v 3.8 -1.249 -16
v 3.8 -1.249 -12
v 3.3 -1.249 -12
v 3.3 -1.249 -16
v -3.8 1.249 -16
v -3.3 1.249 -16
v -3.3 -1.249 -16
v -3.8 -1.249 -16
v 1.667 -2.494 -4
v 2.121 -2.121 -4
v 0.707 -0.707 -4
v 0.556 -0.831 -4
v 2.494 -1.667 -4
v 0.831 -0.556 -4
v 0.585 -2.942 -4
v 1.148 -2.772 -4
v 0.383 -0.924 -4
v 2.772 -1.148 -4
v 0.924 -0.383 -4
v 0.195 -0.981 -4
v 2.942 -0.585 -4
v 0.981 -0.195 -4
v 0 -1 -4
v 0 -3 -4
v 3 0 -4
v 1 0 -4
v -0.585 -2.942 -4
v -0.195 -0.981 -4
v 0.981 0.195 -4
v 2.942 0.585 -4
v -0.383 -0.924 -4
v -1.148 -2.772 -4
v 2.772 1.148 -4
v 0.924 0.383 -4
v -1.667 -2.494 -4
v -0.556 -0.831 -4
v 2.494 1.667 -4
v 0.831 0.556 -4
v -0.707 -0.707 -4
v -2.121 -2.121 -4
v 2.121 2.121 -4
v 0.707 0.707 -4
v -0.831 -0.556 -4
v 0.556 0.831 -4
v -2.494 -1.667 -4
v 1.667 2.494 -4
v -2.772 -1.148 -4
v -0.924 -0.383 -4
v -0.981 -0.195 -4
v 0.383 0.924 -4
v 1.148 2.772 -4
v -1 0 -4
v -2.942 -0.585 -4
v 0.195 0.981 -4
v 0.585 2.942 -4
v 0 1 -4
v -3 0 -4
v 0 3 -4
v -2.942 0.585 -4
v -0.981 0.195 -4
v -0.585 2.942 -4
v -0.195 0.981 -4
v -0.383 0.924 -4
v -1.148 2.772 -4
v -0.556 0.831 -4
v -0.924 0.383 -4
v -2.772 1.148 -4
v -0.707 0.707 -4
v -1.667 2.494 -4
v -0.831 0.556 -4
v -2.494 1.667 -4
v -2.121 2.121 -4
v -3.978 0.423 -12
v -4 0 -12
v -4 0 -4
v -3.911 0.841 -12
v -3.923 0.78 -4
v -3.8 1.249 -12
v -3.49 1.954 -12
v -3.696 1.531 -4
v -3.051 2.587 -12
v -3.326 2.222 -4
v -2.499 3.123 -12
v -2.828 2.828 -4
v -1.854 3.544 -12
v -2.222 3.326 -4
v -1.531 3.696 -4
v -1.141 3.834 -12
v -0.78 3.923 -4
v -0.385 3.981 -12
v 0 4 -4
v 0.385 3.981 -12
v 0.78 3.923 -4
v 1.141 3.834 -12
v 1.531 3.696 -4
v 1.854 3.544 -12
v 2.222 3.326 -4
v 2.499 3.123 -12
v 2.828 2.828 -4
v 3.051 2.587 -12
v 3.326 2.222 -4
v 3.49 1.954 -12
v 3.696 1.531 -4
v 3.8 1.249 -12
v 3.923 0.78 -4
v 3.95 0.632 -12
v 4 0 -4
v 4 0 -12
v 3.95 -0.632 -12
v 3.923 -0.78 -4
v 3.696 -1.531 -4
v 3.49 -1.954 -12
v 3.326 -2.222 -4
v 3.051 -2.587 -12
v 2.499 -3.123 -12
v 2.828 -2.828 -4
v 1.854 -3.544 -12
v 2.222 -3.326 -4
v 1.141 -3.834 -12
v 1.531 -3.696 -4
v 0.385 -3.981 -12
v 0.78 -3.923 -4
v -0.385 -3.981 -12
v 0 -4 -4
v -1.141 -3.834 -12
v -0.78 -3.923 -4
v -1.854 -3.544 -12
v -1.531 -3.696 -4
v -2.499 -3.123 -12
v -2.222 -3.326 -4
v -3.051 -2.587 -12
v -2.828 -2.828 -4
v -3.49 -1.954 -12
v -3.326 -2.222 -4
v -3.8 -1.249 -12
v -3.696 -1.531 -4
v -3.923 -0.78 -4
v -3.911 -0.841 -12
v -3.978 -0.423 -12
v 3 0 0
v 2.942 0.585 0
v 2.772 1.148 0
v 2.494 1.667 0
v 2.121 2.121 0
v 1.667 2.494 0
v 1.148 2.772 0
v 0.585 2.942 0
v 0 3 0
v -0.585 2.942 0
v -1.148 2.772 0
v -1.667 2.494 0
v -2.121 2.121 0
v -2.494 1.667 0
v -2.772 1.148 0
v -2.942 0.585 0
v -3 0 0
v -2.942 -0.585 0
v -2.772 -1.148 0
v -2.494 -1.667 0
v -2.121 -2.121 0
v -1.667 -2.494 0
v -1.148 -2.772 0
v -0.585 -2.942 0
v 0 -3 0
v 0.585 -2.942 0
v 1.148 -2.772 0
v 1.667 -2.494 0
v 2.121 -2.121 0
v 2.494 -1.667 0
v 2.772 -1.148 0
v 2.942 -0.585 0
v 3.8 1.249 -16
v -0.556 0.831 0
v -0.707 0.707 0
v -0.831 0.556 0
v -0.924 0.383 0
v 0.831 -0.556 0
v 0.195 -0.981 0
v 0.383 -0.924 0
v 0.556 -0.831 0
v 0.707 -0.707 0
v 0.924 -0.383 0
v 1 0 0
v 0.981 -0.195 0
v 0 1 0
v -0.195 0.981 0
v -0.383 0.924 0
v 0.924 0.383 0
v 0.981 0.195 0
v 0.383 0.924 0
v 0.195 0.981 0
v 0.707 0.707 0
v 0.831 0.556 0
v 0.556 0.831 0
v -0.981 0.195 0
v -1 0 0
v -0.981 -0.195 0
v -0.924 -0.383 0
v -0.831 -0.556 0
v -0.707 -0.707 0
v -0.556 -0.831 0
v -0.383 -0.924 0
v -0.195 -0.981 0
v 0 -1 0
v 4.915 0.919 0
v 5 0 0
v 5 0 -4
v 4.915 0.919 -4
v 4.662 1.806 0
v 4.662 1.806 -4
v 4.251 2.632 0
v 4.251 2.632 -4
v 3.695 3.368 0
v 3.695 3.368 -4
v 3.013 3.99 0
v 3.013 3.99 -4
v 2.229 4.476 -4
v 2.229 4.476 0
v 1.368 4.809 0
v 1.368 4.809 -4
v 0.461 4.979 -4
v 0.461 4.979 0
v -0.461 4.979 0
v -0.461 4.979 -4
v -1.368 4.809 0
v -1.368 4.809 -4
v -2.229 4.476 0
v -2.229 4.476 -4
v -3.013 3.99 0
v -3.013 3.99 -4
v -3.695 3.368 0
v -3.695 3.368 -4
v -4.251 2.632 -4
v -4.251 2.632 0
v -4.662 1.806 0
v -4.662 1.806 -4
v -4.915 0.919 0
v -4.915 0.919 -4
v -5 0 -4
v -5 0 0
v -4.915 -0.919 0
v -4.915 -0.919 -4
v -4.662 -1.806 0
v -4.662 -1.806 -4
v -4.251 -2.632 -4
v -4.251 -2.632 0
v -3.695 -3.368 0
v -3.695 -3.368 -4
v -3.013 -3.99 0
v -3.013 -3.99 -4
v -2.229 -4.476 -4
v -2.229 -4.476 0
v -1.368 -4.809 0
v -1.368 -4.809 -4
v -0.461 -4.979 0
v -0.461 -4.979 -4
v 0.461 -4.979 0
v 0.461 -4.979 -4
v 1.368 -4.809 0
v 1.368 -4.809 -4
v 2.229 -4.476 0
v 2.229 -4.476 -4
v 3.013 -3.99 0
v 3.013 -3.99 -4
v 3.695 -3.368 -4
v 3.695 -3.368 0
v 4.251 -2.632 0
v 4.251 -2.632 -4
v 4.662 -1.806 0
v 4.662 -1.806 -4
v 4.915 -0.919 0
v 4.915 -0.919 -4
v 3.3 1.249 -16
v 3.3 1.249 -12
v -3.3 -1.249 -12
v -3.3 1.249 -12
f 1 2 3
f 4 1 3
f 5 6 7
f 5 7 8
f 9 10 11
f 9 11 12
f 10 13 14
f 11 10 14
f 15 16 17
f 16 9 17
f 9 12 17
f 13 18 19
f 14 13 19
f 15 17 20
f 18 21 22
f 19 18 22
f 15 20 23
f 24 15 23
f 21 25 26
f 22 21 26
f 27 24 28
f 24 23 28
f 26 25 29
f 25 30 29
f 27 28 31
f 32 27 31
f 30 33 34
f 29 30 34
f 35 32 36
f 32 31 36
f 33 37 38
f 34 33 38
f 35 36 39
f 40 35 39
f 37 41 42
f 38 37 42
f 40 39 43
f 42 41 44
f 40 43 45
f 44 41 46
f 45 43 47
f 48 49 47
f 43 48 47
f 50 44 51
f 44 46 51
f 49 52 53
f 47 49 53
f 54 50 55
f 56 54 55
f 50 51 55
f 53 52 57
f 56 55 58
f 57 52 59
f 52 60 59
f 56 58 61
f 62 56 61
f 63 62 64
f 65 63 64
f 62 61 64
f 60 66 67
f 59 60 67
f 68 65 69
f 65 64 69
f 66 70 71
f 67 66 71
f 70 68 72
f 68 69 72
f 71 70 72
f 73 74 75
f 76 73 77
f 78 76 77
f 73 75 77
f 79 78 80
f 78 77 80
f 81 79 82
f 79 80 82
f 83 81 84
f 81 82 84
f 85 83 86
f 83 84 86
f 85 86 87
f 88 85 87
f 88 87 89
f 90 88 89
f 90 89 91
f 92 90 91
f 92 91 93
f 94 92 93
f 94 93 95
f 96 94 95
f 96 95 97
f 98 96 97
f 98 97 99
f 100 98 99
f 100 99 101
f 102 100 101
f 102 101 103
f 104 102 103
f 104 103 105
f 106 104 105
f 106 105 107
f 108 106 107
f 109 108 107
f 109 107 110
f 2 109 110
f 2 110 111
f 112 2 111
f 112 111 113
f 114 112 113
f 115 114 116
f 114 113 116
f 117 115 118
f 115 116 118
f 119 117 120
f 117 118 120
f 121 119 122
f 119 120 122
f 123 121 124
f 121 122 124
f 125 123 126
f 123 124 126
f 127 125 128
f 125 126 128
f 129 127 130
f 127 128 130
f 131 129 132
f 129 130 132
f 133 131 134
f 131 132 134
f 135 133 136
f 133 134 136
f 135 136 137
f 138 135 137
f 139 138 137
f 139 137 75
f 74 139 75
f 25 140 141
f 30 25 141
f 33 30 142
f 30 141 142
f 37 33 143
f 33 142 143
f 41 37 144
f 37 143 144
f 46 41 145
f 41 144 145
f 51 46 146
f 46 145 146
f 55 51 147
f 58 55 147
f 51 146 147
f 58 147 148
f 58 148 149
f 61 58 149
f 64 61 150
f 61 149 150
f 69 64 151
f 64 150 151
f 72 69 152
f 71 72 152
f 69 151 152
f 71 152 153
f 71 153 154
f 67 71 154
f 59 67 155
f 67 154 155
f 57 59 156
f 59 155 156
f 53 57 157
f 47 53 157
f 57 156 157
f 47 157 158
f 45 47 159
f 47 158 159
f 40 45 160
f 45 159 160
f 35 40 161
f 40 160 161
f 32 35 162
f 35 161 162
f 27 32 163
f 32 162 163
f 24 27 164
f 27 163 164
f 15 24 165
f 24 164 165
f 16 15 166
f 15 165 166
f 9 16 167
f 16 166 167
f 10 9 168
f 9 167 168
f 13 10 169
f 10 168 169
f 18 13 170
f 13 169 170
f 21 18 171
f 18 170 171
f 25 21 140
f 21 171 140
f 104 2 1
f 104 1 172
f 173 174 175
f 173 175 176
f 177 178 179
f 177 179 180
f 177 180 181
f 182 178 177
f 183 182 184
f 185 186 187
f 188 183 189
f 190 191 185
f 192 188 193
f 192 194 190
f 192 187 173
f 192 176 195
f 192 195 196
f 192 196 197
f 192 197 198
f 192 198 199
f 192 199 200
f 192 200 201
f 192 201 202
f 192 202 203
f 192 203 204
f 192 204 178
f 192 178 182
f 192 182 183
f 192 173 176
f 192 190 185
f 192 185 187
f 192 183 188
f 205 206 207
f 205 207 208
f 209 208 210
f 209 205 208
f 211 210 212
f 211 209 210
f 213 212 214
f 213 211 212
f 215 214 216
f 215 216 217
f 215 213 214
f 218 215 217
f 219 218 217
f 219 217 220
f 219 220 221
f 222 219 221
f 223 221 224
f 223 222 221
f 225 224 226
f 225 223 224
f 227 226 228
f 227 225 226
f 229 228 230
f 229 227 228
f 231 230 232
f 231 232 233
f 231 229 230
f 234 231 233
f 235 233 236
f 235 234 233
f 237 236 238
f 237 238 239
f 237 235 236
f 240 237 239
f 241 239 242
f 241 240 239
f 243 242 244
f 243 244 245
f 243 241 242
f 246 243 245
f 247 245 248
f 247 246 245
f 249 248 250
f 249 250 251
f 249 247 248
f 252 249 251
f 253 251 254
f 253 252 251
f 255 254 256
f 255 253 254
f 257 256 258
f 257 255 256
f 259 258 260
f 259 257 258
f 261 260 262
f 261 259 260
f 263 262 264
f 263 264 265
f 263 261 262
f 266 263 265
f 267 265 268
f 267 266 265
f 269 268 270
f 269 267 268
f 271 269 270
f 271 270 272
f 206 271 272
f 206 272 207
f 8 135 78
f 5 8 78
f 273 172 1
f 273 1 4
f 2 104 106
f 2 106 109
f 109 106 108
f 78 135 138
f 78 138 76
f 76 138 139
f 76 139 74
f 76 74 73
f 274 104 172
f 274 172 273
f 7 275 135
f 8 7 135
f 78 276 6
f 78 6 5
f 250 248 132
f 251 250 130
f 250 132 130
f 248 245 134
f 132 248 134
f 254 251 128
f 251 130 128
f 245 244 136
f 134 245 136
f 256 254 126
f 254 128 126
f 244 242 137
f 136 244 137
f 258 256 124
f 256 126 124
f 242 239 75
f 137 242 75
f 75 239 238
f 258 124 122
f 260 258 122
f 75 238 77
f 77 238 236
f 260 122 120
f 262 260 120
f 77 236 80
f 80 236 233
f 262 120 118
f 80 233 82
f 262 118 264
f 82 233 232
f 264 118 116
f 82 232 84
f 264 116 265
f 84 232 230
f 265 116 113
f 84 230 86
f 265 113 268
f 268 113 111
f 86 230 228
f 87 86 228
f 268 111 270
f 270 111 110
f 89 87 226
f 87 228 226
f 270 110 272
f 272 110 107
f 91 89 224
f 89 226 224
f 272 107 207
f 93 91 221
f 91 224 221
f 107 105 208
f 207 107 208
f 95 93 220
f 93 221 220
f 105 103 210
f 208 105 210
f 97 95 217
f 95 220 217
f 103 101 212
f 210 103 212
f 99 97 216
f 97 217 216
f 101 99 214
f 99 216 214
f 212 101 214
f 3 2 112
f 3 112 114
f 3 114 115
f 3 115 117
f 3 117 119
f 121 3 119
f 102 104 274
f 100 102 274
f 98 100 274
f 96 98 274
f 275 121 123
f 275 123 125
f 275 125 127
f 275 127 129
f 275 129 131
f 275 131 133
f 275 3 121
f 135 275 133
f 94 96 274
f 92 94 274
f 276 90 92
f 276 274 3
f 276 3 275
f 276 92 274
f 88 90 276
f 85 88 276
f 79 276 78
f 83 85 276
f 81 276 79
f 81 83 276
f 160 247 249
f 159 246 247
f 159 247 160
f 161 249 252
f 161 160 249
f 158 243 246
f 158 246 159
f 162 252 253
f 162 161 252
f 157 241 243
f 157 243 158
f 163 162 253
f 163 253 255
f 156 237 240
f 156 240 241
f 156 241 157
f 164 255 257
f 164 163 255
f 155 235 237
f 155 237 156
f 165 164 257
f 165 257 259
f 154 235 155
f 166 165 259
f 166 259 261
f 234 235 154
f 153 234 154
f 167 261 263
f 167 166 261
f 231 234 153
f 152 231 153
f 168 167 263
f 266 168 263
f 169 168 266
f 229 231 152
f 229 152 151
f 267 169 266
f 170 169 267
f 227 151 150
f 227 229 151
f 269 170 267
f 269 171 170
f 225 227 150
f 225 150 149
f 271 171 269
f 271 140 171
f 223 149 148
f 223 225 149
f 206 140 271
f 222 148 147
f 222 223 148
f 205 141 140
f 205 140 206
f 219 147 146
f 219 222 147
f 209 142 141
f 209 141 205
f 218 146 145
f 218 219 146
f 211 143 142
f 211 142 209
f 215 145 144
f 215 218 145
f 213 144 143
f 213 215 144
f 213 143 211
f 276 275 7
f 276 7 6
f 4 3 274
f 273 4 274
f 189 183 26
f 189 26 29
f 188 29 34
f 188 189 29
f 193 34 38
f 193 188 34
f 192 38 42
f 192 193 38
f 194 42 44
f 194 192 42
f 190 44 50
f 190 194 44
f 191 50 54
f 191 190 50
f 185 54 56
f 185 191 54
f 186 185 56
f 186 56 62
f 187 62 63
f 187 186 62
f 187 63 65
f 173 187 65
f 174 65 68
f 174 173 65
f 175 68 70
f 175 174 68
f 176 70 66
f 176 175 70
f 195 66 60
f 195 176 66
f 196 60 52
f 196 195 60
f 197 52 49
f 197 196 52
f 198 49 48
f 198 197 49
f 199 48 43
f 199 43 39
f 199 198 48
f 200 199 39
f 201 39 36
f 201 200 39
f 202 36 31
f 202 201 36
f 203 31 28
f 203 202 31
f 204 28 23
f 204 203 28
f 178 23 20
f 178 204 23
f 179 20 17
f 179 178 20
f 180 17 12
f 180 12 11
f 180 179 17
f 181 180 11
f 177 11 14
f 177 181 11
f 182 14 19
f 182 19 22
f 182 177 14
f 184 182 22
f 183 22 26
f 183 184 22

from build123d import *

# Parameters (mm, degrees)
SKETCH1_R             = 5
SKETCH1_R_2           = 3
BOSS_EXTRUDE1_DEPTH   = 4
SKETCH1_R_3           = 1
BOSS_EXTRUDE1_2_DEPTH = 4
SKETCH2_R             = 4
BOSS_EXTRUDE2_DEPTH   = 8
SKETCH3_W             = 0.5
SKETCH3_H             = 2.4979992
BOSS_EXTRUDE3_DEPTH   = 4


with BuildPart() as part:
    # Sketch1 → Boss-Extrude1 (new body)
    with BuildSketch(Plane.XY):
        Circle(SKETCH1_R)
        Circle(SKETCH1_R_2, mode=Mode.SUBTRACT)
    extrude(amount=-BOSS_EXTRUDE1_DEPTH)



with BuildPart() as body_2:
    # Sketch1 → Boss-Extrude1 2 (new body)
    with BuildSketch(Plane.XY):
        Circle(SKETCH1_R_3)
    extrude(amount=-BOSS_EXTRUDE1_2_DEPTH)


with BuildPart() as part_1:
    add(part.part)

    add(body_2.part)  # Boss-Extrude2 merges body 2
    # Sketch2 → Boss-Extrude2 (add)
    with BuildSketch(Plane(origin=(0, 0, -4), x_dir=(-1, 0, 0), z_dir=(0, 0, -1))):
        Circle(SKETCH2_R)
    extrude(amount=BOSS_EXTRUDE2_DEPTH)

    # Sketch3 → Boss-Extrude3 (add)
    with BuildSketch(Plane(origin=(0, 0, -12), x_dir=(-1, 0, 0), z_dir=(0, 0, -1))):
        with Locations((-3.55, 0)):
            Rectangle(SKETCH3_W, SKETCH3_H)
        with Locations((3.55, 0)):
            Rectangle(SKETCH3_W, SKETCH3_H)
    extrude(amount=BOSS_EXTRUDE3_DEPTH)


solid = part_1.part
